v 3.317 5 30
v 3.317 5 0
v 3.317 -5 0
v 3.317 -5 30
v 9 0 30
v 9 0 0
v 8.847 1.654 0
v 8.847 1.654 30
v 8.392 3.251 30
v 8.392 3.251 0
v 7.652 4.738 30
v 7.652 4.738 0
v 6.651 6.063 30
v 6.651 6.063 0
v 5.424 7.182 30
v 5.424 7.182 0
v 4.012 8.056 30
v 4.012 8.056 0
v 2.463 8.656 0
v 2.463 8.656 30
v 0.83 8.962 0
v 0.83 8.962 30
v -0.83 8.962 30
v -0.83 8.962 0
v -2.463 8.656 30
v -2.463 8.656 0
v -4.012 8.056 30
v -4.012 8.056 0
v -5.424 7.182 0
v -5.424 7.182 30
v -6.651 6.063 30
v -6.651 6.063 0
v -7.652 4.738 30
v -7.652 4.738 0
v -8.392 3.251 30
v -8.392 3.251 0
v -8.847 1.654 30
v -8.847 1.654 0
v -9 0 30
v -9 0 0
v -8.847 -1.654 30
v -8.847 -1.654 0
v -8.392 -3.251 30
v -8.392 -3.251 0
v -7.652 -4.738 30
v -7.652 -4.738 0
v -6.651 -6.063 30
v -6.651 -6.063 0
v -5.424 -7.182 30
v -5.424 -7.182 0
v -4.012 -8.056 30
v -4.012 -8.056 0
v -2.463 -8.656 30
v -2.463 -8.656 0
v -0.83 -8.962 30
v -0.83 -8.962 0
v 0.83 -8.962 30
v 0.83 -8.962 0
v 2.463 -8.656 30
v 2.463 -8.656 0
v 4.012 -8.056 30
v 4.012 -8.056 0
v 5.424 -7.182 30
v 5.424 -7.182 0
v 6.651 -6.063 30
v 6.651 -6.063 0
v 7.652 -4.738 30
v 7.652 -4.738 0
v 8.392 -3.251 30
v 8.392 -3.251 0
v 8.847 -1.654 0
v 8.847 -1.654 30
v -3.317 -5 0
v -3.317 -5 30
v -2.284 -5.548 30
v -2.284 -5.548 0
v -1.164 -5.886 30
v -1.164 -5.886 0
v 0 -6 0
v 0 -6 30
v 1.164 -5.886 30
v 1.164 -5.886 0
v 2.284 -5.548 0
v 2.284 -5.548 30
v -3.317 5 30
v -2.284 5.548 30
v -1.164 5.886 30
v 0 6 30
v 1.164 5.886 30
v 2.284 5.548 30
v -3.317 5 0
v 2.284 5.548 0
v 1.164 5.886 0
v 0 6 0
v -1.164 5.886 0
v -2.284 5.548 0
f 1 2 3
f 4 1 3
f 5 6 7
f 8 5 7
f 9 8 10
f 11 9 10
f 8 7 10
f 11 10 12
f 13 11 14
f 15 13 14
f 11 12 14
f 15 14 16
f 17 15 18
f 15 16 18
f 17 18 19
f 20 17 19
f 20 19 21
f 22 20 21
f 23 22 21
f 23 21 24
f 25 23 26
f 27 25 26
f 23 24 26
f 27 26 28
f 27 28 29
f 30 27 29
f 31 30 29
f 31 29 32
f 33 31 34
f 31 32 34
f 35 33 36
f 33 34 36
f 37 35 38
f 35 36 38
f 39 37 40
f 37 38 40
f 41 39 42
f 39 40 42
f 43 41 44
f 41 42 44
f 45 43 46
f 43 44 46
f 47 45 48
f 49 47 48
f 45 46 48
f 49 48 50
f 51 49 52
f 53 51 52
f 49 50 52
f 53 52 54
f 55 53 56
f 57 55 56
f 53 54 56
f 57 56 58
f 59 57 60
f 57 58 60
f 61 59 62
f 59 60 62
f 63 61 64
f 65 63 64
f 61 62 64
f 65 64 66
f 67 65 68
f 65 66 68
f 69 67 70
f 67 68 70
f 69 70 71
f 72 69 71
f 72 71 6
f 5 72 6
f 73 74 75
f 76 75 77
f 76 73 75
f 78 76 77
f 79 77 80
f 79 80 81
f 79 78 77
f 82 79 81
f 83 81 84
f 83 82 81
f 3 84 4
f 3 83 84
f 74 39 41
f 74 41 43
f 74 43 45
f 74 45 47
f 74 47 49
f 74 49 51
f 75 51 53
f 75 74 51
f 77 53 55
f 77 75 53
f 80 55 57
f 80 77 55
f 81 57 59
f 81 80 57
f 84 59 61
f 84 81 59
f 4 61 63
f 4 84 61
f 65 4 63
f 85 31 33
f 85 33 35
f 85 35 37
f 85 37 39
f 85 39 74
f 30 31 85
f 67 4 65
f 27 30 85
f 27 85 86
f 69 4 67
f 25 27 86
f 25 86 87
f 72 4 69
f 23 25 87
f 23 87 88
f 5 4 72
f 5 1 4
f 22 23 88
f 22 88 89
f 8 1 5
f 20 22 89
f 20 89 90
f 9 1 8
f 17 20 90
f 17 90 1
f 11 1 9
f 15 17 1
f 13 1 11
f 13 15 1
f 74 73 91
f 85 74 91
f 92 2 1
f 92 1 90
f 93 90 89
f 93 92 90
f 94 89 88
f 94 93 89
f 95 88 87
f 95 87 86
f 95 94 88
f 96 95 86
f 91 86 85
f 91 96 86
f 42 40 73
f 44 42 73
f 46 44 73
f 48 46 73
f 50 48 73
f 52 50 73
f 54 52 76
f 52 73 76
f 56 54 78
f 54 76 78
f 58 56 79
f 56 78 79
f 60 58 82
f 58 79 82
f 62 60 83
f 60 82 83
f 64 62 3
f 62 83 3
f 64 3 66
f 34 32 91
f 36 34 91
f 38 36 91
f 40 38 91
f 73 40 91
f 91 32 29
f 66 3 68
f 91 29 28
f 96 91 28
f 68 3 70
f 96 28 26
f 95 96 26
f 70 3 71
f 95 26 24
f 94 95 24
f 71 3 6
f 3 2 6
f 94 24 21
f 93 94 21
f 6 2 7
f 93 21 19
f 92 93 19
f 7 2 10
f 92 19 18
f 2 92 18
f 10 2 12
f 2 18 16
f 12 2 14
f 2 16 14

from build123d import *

# Parameters (mm, degrees)
SKETCH1_R           = 9
SKETCH1_R_2         = 6
BOSS_EXTRUDE1_DEPTH = 30


with BuildPart() as part:
    # Sketch1 → Boss-Extrude1 (new body)
    # profile 1 of 3: a face of its own
    with BuildSketch(Plane.XY):
        Circle(SKETCH1_R)
        Circle(SKETCH1_R_2, mode=Mode.SUBTRACT)
    # profile 2 of 3: a face of its own
    with BuildSketch(Plane.XY):
        with BuildLine():
            Line((-3.31662479, -5), (-3.31662479, 5))
            ThreePointArc((-3.31662479, 5), (-6, 0), (-3.31662479, -5))
        make_face()
    # profile 3 of 3: a face of its own
    with BuildSketch(Plane.XY):
        with BuildLine():
            ThreePointArc((6, 0), (5.286764074, 2.837274331), (3.31662479, 5))
            Line((3.31662479, 5), (3.31662479, -5))
            ThreePointArc((3.31662479, -5), (5.286764074, -2.837274331), (6, 0))
        make_face()
    extrude(amount=BOSS_EXTRUDE1_DEPTH)


solid = part.part
